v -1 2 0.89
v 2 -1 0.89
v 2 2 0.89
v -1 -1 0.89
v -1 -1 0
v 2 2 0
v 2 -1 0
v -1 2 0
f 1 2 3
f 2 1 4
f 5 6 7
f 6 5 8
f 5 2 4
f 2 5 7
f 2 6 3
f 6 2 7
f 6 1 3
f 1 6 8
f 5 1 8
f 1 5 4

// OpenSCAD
translate([-1,-1,0])
// .90 would be coincident with the roof surface
cube([3, 3, .89], false);
